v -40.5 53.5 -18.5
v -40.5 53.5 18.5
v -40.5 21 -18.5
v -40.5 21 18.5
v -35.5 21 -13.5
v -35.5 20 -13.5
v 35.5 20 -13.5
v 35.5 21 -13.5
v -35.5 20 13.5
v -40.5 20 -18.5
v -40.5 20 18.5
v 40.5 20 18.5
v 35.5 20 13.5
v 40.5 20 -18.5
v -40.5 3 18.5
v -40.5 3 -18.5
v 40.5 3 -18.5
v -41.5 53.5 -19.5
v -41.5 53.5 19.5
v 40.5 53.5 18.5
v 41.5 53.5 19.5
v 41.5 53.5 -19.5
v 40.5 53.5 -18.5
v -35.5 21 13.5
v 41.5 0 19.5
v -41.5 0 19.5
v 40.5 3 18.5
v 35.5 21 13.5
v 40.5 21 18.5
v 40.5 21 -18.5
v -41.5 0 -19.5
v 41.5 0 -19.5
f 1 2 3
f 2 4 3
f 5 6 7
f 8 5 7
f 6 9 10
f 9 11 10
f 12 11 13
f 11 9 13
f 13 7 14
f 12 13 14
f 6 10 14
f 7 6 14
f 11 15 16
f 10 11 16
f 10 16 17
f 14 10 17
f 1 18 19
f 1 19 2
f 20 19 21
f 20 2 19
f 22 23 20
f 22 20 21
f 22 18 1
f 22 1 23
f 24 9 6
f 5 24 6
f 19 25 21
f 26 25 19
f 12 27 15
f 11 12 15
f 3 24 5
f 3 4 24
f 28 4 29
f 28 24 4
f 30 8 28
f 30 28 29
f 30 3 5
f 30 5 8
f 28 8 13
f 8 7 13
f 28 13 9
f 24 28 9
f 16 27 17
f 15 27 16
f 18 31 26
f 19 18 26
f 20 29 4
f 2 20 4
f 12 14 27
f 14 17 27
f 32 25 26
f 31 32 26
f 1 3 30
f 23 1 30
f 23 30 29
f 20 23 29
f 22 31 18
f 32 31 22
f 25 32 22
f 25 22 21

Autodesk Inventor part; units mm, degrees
ref_plane "YZ Plane" through (0, 0, 0) normal (1, 0, 0) x (0, 1, 0)
ref_plane "XZ Plane" through (0, 0, 0) normal (0, 1, 0) x (-1, 0, 0)
ref_plane "XY Plane" through (0, 0, 0) normal (0, 0, 1) x (1, 0, 0)
sketch "Boceto1" plane through (0, 0, 0) normal (0, 1, 0) x (-1, 0, 0)
  line L0 (-41.5, 19.5) -> (41.5, 19.5)
  line L1 (41.5, 19.5) -> (41.5, -19.5)
  line L2 (41.5, -19.5) -> (-41.5, -19.5)
  line L3 (-41.5, -19.5) -> (-41.5, 19.5)
  line L4 (-41.5, 19.5) -> (41.5, -19.5) construction
  line L5 (41.5, 19.5) -> (-41.5, -19.5) construction
  line L6 (-40.5, 18.5) -> (40.5, 18.5)
  line L7 (40.5, 18.5) -> (40.5, -18.5)
  line L8 (40.5, -18.5) -> (-40.5, -18.5)
  line L9 (-40.5, -18.5) -> (-40.5, 18.5)
  line L10 (-40.5, 18.5) -> (40.5, -18.5) construction
  line L11 (40.5, 18.5) -> (-40.5, -18.5) construction
  point P0 (0, 0)
  dimension "d0" = 83
  dimension "d1" = 39
  dimension "d2" = 1
  dimension "d3" = 1
extrude "Extrusión1" add sketch "Boceto1" along normal blind 3 contours L6 L7 L8 L9
extrude "Extrusión2" add sketch "Boceto1" along normal blind 20
sketch "Boceto2" plane through (0, 20, 0) normal (0, 1, 0) x (1, 0, 0)
  line L0 (41.5, 19.5) -> (-41.5, 19.5) projected
  line L1 (41.5, -19.5) -> (-41.5, -19.5)
  line L2 (-41.5, -19.5) -> (-41.5, 19.5)
  line L3 (-41.5, 19.5) -> (41.5, 19.5)
  line L4 (41.5, 19.5) -> (41.5, -19.5)
  line L5 (41.5, -19.5) -> (-41.5, 19.5) construction
  line L6 (-41.5, -19.5) -> (41.5, 19.5) construction
  line L7 (35.5, -13.5) -> (-35.5, -13.5)
  line L8 (-35.5, -13.5) -> (-35.5, 13.5)
  line L9 (-35.5, 13.5) -> (35.5, 13.5)
  line L10 (35.5, 13.5) -> (35.5, -13.5)
  line L11 (35.5, -13.5) -> (-35.5, 13.5) construction
  line L12 (-35.5, -13.5) -> (35.5, 13.5) construction
  point P0 (0, 0)
  dimension "d8" = 6
  dimension "d9" = 6
extrude "Extrusión3" add sketch "Boceto2" along normal blind 1
sketch "Boceto3" plane through (0, 21, 0) normal (0, 1, 0) x (1, 0, 0)
  point P0 (0, 0)
sketch "Boceto4" plane through (0, 21, 0) normal (0, 1, 0) x (1, 0, 0)
  line L0 (-41.5, 19.5) -> (-41.5, -19.5) projected
  line L1 (41.5, -19.5) -> (-41.5, -19.5)
  line L2 (-41.5, -19.5) -> (-41.5, 19.5)
  line L3 (-41.5, 19.5) -> (41.5, 19.5)
  line L4 (41.5, 19.5) -> (41.5, -19.5)
  line L5 (41.5, -19.5) -> (-41.5, 19.5) construction
  line L6 (-41.5, -19.5) -> (41.5, 19.5) construction
  line L7 (40.5, -18.5) -> (-40.5, -18.5)
  line L8 (-40.5, -18.5) -> (-40.5, 18.5)
  line L9 (-40.5, 18.5) -> (40.5, 18.5)
  line L10 (40.5, 18.5) -> (40.5, -18.5)
  line L11 (40.5, -18.5) -> (-40.5, 18.5) construction
  line L12 (-40.5, -18.5) -> (40.5, 18.5) construction
  point P0 (0, 0)
  point P1 (-41.5, -19.5)
  dimension "d21" = 1
  dimension "d22" = 1
extrude "Extrusión4" add sketch "Boceto4" along normal blind 32.5
properties part number "Capsula" material "Plástico PET"
